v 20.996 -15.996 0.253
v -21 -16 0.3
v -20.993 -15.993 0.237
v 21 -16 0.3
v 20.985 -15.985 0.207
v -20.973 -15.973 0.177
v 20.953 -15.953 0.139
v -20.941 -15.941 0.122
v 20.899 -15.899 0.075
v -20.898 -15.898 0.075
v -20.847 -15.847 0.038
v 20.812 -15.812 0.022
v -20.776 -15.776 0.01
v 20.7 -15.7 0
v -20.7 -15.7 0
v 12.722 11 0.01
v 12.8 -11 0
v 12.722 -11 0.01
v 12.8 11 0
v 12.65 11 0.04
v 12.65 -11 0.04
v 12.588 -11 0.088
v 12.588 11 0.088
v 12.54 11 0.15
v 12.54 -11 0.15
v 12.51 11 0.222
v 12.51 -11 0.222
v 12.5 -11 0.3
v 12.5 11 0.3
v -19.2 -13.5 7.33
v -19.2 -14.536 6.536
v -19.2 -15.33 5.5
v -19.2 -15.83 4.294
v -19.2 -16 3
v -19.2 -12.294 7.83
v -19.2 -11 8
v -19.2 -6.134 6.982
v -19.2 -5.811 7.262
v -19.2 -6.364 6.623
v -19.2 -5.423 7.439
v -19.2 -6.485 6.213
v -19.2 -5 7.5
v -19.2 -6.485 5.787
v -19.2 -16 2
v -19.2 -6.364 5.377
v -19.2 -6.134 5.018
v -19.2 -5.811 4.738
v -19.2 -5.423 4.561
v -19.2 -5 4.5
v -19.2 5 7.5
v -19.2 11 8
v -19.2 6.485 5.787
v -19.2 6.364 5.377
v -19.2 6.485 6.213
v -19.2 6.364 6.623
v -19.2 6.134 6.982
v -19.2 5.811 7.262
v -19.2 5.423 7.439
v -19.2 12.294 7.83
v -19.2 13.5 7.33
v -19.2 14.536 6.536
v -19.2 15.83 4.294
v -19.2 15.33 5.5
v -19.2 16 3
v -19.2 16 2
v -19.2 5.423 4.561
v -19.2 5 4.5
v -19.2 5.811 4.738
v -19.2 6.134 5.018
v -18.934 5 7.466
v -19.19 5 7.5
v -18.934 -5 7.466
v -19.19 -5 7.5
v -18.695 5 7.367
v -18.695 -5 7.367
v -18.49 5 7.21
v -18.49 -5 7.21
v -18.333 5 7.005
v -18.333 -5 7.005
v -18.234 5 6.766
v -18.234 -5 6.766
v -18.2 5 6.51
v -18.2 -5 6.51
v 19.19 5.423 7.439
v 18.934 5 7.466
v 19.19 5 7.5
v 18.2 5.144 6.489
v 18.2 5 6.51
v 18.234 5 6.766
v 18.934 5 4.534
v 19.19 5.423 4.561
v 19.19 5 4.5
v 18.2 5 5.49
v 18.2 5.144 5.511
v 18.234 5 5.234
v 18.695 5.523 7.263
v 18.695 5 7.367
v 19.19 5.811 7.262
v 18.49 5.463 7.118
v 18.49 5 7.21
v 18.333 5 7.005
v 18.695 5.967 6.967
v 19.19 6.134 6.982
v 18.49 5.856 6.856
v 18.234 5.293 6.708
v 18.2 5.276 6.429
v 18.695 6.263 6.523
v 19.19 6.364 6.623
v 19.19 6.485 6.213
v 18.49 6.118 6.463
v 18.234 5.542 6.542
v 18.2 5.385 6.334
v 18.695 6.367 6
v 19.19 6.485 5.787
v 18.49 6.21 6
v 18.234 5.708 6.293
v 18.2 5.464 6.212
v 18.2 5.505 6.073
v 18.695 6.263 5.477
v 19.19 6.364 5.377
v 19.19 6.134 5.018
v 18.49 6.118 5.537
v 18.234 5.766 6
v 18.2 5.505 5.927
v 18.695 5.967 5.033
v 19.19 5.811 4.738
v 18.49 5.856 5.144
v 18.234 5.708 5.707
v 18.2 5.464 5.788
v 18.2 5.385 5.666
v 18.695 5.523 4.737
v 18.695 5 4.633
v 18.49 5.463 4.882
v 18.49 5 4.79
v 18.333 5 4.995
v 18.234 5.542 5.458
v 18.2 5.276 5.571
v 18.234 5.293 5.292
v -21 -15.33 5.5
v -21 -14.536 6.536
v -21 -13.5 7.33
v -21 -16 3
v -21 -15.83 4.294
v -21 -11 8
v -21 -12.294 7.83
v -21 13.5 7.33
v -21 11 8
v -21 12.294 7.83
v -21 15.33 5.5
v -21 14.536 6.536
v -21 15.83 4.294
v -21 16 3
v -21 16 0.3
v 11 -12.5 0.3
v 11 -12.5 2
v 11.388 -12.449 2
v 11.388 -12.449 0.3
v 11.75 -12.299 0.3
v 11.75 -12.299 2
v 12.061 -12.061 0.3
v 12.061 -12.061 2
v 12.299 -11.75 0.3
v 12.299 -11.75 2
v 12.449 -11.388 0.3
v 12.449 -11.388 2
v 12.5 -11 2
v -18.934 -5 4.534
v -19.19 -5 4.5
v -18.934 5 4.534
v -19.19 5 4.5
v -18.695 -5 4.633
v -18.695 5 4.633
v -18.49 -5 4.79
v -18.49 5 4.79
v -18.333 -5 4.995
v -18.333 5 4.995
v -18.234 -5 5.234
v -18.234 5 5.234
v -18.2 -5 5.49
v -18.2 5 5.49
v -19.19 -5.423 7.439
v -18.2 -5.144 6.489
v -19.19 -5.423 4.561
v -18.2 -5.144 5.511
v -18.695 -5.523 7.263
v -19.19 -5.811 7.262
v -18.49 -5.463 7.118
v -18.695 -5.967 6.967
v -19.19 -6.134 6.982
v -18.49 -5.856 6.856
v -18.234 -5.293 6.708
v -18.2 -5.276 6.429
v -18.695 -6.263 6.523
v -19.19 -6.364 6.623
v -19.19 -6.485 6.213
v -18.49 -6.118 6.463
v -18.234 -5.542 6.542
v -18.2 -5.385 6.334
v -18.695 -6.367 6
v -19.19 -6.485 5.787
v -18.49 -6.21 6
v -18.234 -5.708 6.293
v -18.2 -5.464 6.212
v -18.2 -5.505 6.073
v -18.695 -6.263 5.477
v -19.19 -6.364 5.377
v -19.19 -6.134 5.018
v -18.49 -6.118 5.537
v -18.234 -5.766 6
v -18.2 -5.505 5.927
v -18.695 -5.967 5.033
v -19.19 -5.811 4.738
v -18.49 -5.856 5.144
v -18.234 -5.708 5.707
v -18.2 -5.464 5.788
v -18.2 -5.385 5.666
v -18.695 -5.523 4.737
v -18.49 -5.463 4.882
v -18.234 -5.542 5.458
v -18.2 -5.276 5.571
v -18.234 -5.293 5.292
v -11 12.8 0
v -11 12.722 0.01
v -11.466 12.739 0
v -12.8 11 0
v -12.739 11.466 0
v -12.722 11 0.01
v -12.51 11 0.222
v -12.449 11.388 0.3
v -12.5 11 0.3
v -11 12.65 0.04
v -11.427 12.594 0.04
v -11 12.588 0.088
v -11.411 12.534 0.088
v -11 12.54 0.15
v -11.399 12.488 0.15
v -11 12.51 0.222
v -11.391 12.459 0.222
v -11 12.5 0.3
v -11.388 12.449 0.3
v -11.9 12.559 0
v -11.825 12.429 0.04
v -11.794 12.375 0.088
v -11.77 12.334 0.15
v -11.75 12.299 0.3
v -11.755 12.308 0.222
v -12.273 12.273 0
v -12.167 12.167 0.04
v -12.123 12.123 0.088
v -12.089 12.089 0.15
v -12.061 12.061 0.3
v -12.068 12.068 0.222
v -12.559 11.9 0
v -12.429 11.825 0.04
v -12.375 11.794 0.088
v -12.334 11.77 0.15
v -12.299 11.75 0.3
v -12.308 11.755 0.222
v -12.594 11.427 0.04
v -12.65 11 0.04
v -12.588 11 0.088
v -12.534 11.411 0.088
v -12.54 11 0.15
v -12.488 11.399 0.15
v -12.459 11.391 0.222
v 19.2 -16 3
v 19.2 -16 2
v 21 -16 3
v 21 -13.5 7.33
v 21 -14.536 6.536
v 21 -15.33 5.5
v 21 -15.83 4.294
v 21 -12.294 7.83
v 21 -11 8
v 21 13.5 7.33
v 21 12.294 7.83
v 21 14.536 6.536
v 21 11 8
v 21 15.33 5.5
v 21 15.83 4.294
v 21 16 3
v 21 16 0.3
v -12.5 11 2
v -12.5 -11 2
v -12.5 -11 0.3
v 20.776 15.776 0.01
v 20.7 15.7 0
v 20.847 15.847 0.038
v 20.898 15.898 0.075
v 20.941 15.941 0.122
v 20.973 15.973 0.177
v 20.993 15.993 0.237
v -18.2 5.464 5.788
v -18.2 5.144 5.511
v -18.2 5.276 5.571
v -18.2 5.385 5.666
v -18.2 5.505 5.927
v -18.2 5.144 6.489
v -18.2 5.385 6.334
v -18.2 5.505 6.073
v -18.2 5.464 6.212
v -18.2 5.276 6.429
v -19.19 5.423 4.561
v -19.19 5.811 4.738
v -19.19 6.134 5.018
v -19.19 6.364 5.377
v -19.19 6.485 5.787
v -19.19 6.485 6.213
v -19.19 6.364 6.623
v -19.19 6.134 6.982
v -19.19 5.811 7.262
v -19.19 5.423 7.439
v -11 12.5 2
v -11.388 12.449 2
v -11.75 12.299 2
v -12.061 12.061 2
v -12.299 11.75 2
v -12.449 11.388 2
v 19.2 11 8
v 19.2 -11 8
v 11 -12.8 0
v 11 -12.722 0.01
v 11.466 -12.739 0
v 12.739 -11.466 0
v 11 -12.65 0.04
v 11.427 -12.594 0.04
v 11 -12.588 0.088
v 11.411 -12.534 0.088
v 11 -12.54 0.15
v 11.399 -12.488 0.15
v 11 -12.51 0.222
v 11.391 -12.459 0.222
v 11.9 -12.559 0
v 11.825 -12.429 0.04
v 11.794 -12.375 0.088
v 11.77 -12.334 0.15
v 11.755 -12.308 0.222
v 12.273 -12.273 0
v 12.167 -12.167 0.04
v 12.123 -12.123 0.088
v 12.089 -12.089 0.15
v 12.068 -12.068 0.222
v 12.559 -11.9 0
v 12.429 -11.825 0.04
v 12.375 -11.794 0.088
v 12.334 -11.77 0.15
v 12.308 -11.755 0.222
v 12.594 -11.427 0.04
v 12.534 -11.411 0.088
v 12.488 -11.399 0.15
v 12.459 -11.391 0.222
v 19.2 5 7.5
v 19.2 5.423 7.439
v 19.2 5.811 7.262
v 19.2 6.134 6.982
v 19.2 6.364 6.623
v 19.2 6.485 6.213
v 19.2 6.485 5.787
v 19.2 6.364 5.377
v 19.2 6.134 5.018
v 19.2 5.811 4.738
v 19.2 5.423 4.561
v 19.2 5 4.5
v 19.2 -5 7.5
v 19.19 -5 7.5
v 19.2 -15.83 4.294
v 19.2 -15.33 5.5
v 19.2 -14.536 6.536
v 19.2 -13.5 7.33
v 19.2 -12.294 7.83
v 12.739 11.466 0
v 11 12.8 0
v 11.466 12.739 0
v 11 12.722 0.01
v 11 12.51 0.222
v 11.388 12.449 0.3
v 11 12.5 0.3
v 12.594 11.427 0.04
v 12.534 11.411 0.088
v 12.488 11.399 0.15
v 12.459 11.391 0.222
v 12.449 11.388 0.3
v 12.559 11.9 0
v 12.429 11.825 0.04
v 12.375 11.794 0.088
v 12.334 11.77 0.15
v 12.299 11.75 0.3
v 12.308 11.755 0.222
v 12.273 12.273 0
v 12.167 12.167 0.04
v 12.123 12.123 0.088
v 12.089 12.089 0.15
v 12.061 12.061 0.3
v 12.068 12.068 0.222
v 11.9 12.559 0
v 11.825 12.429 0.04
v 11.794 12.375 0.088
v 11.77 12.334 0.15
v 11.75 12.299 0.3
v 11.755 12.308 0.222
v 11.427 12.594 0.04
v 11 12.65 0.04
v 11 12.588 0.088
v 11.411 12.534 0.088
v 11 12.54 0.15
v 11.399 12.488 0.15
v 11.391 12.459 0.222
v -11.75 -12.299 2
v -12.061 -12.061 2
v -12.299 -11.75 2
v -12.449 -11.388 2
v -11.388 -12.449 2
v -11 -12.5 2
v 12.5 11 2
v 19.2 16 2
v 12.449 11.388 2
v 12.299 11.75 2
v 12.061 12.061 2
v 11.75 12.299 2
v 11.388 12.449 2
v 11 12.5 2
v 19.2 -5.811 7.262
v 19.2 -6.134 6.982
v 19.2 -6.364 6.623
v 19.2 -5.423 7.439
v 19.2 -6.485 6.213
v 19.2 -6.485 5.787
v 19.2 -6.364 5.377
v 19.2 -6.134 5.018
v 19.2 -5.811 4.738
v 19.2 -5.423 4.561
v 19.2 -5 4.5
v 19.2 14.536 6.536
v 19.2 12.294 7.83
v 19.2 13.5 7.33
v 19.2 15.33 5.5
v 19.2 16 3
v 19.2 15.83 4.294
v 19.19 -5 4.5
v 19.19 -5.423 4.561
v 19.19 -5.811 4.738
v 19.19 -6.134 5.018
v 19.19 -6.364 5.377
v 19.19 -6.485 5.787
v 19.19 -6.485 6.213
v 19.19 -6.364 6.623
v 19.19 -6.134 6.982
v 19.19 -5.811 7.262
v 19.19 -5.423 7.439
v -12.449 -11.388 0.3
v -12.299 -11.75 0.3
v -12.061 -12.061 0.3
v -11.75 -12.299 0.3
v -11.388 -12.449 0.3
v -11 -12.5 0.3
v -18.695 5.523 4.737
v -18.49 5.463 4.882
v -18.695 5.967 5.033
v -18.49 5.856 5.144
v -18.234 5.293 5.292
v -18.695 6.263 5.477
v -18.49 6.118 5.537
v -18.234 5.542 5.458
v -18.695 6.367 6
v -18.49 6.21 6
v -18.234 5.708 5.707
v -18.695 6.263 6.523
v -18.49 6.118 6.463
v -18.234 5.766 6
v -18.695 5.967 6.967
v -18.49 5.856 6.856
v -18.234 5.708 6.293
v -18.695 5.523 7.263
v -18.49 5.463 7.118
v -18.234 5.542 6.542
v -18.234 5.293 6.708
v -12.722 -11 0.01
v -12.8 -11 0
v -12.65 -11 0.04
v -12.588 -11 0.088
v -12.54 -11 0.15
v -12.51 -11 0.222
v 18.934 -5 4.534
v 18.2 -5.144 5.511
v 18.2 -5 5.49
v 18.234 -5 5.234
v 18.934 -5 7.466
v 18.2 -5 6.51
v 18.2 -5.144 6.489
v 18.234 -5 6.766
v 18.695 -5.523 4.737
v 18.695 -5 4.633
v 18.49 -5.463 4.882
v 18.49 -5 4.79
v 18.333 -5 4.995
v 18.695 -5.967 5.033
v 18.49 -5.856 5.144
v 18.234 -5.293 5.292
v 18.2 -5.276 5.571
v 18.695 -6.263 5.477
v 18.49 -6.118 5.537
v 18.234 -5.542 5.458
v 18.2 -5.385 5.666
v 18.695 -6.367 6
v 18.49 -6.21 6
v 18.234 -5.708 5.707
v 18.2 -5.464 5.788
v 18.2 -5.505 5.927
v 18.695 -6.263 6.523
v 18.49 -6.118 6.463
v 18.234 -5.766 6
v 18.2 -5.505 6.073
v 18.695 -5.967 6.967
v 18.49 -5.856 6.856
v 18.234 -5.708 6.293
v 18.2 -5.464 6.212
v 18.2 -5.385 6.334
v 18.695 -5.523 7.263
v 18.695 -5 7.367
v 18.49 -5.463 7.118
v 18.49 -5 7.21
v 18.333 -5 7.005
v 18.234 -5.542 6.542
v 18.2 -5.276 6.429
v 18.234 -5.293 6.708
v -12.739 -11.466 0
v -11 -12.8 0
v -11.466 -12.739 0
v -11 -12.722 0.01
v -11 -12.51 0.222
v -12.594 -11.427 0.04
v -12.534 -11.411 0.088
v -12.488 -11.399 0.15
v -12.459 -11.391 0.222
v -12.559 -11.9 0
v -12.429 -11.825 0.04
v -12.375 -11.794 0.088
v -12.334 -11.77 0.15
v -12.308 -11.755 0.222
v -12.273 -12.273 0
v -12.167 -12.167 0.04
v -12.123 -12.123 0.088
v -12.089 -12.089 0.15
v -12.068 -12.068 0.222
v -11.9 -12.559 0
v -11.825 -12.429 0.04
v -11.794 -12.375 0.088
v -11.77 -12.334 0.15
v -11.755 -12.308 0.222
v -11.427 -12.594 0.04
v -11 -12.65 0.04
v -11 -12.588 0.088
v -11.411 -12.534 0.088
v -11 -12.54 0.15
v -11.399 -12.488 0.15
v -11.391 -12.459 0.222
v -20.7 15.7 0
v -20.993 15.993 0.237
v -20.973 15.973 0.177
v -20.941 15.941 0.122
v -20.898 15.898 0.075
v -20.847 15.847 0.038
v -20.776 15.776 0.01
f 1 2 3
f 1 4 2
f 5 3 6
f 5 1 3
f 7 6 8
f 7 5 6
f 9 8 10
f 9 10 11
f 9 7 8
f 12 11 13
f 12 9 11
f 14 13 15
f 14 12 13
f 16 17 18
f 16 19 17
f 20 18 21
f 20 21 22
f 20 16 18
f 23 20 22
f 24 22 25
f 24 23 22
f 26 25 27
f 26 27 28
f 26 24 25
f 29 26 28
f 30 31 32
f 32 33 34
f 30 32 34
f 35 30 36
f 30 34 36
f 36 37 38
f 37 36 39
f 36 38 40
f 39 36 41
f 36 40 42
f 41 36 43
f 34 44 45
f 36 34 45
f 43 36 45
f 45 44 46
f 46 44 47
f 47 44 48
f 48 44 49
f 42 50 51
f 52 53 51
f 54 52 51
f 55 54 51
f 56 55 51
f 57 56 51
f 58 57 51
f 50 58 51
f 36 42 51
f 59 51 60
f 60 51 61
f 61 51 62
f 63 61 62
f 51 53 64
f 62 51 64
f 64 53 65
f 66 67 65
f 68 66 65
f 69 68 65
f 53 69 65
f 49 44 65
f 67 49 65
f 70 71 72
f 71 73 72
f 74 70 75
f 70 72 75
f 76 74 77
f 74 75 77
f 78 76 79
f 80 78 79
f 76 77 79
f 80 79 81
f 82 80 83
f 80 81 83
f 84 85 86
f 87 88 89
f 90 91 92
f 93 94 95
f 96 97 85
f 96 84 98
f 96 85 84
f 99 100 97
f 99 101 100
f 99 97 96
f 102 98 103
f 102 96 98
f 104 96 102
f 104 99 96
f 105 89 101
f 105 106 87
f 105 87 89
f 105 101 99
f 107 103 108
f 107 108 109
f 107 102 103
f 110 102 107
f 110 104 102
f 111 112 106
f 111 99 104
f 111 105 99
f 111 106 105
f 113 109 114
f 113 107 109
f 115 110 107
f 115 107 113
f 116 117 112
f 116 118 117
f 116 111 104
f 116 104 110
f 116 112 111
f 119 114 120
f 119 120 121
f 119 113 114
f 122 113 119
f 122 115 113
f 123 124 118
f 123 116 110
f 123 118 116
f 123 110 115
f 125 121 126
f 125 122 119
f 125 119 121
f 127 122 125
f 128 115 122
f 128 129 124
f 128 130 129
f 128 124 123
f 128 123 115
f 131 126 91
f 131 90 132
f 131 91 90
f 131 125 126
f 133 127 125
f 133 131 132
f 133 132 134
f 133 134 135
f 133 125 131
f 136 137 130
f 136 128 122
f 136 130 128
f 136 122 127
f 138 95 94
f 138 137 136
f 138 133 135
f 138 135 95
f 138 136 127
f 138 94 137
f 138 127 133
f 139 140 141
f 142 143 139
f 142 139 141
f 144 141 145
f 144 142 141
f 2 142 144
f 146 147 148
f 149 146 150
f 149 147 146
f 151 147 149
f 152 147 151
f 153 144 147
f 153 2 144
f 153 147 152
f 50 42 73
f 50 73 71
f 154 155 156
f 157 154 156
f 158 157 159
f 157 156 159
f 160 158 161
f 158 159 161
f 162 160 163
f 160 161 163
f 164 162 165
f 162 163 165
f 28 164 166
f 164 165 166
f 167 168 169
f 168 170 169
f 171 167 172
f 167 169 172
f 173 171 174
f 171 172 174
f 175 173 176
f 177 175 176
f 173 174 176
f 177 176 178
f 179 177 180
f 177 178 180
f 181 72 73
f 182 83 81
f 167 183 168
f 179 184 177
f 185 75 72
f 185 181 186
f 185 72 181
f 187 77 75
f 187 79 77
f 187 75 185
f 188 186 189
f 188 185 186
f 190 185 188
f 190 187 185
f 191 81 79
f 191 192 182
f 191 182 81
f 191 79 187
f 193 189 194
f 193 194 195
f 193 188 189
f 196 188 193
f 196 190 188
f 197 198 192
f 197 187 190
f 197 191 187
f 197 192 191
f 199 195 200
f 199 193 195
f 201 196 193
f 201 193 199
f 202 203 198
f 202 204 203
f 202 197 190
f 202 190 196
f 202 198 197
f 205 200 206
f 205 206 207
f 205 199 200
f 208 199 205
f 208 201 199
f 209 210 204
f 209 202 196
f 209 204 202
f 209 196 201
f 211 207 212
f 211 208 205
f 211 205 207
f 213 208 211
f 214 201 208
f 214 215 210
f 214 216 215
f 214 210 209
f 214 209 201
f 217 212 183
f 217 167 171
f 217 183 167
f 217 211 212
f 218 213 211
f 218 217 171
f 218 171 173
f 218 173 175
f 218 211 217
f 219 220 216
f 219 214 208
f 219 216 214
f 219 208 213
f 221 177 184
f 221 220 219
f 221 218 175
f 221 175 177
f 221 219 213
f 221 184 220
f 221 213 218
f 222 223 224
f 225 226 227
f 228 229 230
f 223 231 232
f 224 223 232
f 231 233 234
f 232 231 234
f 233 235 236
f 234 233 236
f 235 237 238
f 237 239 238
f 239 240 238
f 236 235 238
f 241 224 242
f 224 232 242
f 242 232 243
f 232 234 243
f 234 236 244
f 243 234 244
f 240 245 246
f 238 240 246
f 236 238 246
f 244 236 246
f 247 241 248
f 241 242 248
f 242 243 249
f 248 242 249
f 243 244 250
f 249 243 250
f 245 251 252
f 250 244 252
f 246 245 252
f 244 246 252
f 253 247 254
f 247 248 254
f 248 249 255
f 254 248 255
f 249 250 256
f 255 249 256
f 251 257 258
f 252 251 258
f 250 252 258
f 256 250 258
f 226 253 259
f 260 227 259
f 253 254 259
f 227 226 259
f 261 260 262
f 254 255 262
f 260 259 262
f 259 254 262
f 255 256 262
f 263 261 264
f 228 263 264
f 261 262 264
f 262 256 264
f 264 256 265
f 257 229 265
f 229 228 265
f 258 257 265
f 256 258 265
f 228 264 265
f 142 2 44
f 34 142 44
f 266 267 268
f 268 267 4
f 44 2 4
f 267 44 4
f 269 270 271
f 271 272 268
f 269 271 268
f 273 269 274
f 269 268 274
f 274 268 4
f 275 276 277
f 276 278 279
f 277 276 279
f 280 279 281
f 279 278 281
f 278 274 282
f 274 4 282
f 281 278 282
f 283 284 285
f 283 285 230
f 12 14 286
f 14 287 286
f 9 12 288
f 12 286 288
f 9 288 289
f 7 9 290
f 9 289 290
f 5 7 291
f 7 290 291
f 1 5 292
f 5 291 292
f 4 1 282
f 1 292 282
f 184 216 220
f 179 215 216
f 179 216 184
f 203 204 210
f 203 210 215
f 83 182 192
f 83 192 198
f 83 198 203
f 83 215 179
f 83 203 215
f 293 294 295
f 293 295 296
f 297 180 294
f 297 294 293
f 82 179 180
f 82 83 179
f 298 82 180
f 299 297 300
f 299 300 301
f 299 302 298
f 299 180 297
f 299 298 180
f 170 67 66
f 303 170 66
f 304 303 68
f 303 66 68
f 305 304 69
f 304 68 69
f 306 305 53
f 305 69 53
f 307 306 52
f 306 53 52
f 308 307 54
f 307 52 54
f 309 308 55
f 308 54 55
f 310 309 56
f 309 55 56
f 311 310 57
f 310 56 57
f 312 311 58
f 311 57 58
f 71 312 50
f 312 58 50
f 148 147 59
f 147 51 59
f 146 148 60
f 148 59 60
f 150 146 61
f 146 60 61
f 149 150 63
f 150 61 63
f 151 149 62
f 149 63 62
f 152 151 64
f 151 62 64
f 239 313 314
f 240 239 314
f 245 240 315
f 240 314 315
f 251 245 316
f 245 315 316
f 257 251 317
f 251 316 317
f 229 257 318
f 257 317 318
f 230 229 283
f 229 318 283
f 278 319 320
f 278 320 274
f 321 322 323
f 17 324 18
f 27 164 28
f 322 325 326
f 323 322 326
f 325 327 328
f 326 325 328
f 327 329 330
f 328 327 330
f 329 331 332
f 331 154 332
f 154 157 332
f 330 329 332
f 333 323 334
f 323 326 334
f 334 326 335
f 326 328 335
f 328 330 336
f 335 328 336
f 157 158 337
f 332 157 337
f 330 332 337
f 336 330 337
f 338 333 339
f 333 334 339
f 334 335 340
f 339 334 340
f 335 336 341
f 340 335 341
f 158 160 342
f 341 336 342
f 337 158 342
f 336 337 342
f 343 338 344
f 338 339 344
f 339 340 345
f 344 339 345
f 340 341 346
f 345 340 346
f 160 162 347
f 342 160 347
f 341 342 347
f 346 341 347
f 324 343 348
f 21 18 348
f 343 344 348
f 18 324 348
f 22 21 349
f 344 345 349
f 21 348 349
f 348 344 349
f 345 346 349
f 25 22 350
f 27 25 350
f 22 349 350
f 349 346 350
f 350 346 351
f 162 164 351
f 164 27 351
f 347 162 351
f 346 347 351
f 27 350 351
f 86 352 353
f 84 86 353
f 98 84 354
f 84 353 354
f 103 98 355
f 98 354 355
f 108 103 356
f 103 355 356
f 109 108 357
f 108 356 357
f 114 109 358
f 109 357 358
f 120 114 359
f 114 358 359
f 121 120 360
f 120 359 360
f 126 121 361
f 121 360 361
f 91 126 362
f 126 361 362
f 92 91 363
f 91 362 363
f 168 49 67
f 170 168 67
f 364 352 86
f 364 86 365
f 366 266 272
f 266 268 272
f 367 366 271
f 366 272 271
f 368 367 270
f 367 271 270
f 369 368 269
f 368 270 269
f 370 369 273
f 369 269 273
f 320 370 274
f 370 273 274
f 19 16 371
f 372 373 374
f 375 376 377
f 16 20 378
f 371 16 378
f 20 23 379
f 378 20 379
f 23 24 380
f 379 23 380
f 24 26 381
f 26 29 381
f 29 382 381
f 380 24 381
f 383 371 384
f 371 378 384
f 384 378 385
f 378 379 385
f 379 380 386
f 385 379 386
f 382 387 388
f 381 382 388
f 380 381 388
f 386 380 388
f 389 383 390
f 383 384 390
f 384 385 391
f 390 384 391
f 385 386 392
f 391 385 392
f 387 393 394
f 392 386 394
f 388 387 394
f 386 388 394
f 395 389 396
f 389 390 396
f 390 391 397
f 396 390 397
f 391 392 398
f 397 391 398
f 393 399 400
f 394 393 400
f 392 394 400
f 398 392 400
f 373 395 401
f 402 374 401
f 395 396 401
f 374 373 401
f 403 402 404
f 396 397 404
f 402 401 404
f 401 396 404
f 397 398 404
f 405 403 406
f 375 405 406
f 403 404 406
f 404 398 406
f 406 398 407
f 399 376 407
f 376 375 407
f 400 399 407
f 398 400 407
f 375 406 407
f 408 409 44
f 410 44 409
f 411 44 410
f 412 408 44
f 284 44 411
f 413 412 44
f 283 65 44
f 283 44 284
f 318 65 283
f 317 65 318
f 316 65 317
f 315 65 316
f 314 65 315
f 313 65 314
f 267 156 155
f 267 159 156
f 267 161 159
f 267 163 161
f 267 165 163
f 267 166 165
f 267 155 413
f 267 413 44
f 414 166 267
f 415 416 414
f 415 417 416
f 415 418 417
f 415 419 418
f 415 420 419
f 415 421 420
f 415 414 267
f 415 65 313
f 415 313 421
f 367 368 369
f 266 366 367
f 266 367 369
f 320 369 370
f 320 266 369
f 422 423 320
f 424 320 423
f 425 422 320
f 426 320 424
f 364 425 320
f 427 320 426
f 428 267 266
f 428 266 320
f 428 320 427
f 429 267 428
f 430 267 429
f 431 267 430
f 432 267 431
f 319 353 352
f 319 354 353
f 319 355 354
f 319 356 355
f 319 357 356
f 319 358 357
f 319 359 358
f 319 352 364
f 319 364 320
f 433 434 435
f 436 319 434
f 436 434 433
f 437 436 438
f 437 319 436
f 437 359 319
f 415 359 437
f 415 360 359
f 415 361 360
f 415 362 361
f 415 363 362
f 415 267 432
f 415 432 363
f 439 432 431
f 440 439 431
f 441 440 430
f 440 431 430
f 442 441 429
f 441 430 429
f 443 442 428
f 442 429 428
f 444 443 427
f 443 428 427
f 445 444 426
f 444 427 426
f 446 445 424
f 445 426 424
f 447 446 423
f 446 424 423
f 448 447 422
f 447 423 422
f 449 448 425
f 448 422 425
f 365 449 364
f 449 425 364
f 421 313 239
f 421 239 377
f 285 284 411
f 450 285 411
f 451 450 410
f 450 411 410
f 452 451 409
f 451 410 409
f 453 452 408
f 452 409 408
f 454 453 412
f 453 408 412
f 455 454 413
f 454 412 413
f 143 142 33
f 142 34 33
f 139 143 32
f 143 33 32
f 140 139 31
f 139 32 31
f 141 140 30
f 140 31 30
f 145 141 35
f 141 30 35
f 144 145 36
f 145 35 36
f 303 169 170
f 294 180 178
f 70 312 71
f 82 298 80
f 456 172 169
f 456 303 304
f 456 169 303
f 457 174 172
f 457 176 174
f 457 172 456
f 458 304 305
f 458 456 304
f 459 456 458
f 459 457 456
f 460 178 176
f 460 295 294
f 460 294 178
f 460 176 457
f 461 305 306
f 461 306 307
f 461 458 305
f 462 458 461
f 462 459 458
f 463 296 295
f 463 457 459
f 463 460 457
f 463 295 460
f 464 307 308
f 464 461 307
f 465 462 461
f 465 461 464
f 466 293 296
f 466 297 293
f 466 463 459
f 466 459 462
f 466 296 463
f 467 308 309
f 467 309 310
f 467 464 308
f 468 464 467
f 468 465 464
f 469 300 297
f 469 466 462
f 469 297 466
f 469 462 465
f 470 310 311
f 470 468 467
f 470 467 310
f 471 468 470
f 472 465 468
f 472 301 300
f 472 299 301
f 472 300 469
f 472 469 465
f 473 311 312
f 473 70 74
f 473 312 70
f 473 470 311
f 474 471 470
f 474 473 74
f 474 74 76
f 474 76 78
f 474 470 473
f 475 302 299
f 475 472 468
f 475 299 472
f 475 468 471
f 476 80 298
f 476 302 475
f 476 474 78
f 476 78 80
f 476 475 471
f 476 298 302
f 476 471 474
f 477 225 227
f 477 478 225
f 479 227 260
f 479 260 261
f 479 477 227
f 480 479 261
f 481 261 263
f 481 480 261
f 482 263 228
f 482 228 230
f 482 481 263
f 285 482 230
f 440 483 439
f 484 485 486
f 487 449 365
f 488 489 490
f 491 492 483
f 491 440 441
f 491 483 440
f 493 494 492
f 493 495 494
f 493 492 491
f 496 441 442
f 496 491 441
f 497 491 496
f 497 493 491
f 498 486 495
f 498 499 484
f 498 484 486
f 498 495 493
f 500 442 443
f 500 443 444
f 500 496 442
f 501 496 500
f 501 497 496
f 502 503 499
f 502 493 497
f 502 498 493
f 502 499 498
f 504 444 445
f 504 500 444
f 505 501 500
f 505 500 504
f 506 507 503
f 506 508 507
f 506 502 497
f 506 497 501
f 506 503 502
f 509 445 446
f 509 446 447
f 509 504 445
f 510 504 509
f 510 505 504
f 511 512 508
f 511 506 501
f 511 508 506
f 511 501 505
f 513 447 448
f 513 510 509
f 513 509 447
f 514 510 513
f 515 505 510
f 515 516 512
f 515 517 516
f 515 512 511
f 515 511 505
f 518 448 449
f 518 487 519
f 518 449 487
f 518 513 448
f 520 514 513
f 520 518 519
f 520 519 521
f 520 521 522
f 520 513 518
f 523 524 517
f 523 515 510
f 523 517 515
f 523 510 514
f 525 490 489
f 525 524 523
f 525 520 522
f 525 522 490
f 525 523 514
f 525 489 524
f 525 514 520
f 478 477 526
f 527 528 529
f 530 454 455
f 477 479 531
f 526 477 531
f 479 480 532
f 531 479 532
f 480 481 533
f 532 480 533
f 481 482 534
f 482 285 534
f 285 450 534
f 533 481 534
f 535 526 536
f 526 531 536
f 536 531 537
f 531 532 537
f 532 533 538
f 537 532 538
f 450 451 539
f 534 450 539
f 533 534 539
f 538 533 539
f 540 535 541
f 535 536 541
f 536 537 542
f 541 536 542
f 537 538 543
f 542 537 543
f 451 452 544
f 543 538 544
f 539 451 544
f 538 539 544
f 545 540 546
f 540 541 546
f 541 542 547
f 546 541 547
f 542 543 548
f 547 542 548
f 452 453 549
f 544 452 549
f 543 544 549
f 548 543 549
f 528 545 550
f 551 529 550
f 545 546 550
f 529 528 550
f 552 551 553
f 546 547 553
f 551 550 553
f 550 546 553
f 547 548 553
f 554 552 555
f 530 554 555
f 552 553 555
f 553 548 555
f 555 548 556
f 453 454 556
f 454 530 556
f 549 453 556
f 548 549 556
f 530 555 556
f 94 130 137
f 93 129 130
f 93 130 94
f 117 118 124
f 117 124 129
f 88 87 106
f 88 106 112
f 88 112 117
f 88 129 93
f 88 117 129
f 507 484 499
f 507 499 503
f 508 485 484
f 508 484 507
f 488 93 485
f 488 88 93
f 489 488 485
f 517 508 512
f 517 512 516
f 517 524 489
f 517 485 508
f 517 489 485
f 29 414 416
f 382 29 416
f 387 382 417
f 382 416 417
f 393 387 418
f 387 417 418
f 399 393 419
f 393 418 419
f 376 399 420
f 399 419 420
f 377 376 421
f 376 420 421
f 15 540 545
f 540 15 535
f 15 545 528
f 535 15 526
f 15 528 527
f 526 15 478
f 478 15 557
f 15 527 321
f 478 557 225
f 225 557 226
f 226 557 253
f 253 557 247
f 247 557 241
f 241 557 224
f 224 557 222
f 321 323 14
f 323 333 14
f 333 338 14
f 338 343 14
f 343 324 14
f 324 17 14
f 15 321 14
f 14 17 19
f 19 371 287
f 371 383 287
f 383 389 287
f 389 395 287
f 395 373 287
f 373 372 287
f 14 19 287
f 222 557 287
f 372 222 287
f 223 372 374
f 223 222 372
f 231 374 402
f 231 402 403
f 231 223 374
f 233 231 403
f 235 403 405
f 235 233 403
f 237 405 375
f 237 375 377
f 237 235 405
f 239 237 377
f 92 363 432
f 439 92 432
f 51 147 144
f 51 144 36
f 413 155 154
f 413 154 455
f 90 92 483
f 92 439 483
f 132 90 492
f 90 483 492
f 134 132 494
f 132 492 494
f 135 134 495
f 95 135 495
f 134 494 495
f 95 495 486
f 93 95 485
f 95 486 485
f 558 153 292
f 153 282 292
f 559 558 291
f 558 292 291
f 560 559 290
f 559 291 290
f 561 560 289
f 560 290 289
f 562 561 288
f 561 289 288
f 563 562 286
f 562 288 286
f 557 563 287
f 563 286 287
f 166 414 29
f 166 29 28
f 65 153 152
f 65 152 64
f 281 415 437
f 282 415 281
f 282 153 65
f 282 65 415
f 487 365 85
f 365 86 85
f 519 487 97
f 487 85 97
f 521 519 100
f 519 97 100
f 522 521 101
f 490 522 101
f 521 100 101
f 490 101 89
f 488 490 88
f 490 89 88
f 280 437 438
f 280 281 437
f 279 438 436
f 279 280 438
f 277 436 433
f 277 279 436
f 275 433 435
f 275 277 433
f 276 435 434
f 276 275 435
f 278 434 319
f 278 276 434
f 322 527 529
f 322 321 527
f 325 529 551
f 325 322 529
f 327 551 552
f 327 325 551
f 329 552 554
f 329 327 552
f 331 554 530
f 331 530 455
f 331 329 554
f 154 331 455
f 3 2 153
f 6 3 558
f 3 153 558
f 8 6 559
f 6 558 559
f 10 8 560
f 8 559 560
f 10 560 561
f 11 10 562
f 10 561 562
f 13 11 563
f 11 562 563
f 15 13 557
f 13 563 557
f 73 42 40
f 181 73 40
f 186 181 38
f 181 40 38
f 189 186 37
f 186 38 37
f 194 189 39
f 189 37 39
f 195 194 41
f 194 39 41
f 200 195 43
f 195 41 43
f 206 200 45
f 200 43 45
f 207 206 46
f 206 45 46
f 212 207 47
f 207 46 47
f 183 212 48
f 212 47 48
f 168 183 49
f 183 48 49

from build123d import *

# Parameters (mm, degrees)
SKETCH_W     = 42
SKETCH_H     = 32
PAD_DEPTH    = 2
POCKET_DEPTH = 2.001
SKETCH004_W  = 1.8
SKETCH004_H  = 32
PAD001_DEPTH = 6
PAD002_DEPTH = 1
PAD003_DEPTH = 1
FILLET_R     = 0.99
FILLET001_R  = 5
FILLET002_R  = 0.3


with BuildPart() as part:
    # Sketch → Pad (new body)
    with BuildSketch(Plane.XY):
        Rectangle(SKETCH_W, SKETCH_H)
    extrude(amount=PAD_DEPTH)

    # Sketch001 (on Face6 of Pad) → Pocket (cut, through all)
    with BuildSketch(Plane.XY.offset(2)):
        with BuildLine():
            Line((-11, 12.5), (11, 12.5))
            ThreePointArc((12.5, 11), (12.06066, 12.06066), (11, 12.5))
            Line((12.5, 11), (12.5, -11))
            ThreePointArc((11, -12.5), (12.06066, -12.06066), (12.5, -11))
            Line((11, -12.5), (-11, -12.5))
            ThreePointArc((-12.5, -11), (-12.06066, -12.06066), (-11, -12.5))
            Line((-12.5, -11), (-12.5, 11))
            ThreePointArc((-11, 12.5), (-12.06066, 12.06066), (-12.5, 11))
        make_face()
    extrude(amount=-POCKET_DEPTH, mode=Mode.SUBTRACT)

    # Sketch004 (on Face5 of Pocket) → Pad001 (join)
    with BuildSketch(Plane.XY.offset(2)):
        with Locations((-20.1, 0)):
            Rectangle(SKETCH004_W, SKETCH004_H)
        with Locations((20.1, 0)):
            Rectangle(SKETCH004_W, SKETCH004_H)
    extrude(amount=PAD001_DEPTH)

    # Sketch005 (on Face22 of Pad001) → Pad002 (join)
    with BuildSketch(Plane.YZ.offset(-19.2)):
        with BuildLine():
            ThreePointArc((-5, 7.5), (-6.5, 6), (-5, 4.5))
            Line((-5, 4.5), (5, 4.5))
            ThreePointArc((5, 4.5), (6.5, 6), (5, 7.5))
            Line((-5, 7.5), (5, 7.5))
        make_face()
    extrude(amount=PAD002_DEPTH)

    # Sketch006 (on Face23 of Pad002) → Pad003 (join)
    with BuildSketch(Plane(origin=(19.2, 0, 0), x_dir=(0, -1, 0), z_dir=(-1, 0, 0))):
        with BuildLine():
            ThreePointArc((-5, 7.5), (-6.5, 6), (-5, 4.5))
            Line((-5, 4.5), (5, 4.5))
            ThreePointArc((5, 4.5), (6.5, 6), (5, 7.5))
            Line((-5, 7.5), (5, 7.5))
        make_face()
    extrude(amount=PAD003_DEPTH)

    # Fillet
    fillet_edges = [part.edges().sort_by_distance(p)[0] for p in [
        (18.2, 6.5, 6),
        (18.2, 0, 4.5),
        (18.2, -6.5, 6),
        (18.2, 0, 7.5),
        (-18.2, -6.5, 6),
        (-18.2, 0, 4.5),
        (-18.2, 6.5, 6),
        (-18.2, 0, 7.5),
    ]]
    fillet(fillet_edges, radius=FILLET_R)

    # Fillet001
    fillet001_edges = [part.edges().sort_by_distance(p)[0] for p in [
        (20.1, 16, 8),
        (20.1, -16, 8),
        (-20.1, 16, 8),
        (-20.1, -16, 8),
    ]]
    fillet(fillet001_edges, radius=FILLET001_R)

    # Fillet002
    fillet002_edges = [part.edges().sort_by_distance(p)[0] for p in [
        (0, 16, 0),
        (-21, 0, 0),
        (21, 0, 0),
        (0, -16, 0),
        (12.06066, -12.06066, 0),
        (12.5, 0, 0),
        (12.06066, 12.06066, 0),
        (0, 12.5, 0),
        (-12.06066, 12.06066, 0),
        (-12.5, 0, 0),
        (-12.06066, -12.06066, 0),
        (0, -12.5, 0),
    ]]
    fillet(fillet002_edges, radius=FILLET002_R)


solid = part.part
